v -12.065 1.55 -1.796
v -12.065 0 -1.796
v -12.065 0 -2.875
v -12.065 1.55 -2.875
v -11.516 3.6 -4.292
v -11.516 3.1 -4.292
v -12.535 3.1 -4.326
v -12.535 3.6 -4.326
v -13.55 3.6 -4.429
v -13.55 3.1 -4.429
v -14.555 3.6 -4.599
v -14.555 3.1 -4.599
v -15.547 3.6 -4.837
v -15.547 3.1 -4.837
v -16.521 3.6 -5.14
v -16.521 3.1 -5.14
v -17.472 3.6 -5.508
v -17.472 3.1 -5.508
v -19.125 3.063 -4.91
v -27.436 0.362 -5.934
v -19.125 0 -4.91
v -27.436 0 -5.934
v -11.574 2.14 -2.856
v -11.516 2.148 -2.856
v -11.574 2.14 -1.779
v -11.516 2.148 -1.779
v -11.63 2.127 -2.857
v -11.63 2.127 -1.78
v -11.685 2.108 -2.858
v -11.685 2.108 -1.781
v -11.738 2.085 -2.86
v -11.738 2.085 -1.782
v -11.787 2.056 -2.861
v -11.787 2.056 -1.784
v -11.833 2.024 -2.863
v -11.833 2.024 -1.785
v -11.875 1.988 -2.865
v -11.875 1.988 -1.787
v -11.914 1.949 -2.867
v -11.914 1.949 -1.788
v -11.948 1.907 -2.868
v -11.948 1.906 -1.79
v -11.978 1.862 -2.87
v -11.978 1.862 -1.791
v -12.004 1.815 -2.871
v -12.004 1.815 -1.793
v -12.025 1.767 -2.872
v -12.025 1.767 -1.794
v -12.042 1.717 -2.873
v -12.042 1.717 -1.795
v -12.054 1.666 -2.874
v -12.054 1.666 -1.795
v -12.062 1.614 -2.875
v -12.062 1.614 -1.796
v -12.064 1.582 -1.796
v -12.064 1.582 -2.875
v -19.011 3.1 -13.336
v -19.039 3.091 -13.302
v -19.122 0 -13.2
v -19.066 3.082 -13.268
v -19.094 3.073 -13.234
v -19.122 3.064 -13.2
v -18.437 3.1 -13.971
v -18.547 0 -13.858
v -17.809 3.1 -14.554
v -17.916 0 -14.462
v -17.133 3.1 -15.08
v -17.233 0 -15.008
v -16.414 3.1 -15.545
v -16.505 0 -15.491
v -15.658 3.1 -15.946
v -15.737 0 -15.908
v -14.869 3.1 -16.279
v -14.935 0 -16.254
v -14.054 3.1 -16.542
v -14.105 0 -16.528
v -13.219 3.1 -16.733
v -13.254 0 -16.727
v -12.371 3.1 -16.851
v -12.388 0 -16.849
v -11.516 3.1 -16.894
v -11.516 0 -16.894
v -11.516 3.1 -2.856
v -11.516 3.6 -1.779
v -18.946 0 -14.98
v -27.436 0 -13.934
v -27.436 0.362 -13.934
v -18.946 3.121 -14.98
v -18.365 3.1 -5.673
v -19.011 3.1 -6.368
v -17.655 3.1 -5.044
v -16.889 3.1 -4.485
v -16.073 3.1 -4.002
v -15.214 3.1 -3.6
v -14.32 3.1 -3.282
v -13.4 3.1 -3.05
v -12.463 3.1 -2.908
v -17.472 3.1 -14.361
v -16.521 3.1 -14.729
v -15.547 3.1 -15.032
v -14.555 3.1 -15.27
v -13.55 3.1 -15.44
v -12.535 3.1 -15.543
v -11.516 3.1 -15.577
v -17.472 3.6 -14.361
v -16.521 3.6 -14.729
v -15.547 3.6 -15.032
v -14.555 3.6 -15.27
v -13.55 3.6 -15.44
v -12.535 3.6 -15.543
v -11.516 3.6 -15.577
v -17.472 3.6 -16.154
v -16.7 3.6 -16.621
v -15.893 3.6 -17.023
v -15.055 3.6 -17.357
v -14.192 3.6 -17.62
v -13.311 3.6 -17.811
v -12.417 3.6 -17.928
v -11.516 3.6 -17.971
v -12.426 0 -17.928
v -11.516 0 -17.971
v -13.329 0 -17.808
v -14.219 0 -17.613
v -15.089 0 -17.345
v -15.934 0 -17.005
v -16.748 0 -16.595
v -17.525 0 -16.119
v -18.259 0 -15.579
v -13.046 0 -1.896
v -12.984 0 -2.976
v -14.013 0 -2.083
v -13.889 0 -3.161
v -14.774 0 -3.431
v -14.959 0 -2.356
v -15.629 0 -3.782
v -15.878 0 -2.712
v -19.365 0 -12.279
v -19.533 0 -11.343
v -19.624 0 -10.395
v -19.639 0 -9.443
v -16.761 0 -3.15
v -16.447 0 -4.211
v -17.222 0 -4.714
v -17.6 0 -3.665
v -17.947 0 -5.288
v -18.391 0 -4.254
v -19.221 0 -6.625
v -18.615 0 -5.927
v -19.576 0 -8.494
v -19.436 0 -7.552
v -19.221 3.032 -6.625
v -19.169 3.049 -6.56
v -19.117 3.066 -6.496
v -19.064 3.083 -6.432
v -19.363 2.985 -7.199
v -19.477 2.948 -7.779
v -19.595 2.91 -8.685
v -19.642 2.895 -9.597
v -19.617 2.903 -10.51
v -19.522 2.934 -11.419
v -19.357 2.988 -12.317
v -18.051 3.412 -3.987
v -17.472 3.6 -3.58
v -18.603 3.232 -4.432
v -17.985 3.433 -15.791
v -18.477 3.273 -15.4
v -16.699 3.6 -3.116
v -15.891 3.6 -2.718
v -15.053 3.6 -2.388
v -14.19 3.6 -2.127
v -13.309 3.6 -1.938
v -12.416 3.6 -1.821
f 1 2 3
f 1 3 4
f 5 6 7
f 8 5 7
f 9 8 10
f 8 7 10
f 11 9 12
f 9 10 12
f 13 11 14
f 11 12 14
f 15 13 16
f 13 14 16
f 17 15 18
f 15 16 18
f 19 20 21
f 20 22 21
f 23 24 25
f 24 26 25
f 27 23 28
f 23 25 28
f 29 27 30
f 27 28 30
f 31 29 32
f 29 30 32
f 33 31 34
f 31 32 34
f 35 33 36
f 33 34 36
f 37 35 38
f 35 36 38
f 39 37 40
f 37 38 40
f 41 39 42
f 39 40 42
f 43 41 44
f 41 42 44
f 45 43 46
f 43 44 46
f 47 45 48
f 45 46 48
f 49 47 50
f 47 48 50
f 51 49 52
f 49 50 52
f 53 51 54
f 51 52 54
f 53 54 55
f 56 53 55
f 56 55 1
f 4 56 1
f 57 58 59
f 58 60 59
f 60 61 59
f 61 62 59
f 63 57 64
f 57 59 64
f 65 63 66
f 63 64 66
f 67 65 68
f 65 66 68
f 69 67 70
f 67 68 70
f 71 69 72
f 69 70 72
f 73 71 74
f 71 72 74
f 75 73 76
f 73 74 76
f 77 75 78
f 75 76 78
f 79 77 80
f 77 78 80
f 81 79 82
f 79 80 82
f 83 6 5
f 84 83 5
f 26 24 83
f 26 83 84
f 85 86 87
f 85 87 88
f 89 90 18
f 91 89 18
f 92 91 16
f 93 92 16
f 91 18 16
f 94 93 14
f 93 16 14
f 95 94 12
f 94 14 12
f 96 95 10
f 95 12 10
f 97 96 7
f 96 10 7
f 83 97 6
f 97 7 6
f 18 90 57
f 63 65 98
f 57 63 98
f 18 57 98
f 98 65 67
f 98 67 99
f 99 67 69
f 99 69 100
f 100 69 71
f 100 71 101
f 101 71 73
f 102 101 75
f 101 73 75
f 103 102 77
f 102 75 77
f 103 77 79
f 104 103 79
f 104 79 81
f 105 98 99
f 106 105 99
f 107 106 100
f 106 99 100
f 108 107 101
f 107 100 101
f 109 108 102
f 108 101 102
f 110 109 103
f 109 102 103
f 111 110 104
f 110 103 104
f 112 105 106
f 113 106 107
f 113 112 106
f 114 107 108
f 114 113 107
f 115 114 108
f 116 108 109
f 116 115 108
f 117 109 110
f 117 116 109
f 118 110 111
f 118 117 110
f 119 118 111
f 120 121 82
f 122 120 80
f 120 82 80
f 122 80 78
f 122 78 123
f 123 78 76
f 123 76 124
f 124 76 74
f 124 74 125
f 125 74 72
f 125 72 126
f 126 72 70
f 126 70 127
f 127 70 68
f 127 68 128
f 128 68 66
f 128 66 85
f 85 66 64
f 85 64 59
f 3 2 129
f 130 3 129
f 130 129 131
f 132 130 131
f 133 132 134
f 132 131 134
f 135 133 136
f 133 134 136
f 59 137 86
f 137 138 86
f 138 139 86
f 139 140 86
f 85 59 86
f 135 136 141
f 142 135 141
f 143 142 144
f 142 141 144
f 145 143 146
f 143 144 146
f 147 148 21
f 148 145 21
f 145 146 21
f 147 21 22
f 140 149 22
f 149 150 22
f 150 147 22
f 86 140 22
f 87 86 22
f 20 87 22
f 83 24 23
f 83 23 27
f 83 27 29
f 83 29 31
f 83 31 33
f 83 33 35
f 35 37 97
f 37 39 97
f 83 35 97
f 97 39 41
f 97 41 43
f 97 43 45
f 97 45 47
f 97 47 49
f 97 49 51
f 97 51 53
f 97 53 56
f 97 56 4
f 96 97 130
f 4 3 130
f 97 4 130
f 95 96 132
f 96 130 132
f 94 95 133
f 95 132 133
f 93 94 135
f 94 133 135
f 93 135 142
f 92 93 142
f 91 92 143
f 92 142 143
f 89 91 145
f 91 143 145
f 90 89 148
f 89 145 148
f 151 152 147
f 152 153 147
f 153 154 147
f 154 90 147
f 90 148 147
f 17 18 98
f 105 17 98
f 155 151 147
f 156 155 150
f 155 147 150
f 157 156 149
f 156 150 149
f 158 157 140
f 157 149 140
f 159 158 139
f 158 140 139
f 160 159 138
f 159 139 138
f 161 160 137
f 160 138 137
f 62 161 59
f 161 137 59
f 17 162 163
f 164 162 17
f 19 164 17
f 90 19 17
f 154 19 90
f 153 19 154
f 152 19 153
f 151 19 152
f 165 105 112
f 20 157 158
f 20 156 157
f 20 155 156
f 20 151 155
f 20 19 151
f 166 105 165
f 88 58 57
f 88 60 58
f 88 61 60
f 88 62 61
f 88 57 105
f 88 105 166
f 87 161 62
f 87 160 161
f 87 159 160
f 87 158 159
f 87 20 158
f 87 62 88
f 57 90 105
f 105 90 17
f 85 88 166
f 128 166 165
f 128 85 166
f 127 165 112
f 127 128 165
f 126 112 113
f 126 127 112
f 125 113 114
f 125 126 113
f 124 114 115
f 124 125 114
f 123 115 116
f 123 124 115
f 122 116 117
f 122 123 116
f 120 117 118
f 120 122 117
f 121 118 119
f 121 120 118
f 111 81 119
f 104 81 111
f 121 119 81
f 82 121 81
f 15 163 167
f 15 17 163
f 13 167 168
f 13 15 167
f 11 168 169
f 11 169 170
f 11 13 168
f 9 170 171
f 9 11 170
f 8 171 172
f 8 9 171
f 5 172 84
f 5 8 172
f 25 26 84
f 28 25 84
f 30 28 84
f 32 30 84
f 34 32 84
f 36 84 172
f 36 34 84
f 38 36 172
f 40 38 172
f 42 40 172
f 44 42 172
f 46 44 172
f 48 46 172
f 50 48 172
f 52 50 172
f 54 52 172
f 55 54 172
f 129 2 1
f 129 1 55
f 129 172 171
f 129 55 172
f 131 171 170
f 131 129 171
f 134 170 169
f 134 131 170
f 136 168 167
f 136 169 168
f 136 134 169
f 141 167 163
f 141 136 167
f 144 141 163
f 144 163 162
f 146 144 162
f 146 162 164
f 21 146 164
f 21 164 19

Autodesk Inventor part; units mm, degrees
sketch "Skizze1" plane through (0, 0, 0) normal (0, 1, 0) x (-1, 0, 0)
  line L0 (0, 0) -> (21.4435, 0) construction
  line L1 (21.4435, 0) -> (21.4435, -17.7713) construction
  line L2 (21.4435, -17.7713) -> (0, -17.7713) construction
  line L3 (0, -17.7713) -> (0, 0) construction
  arc A0 (3.4429, -6.1124) -> (3.5369, -12.2987) centre (13.9264, -9.047) ccw
  arc A1 (3.5369, -12.2987) -> (17.7561, -12.2571) centre (10.6298, -6.5721) ccw
  arc A2 (17.8481, -6.152) -> (3.4429, -6.1124) centre (10.6298, -11.844) ccw
  arc A3 (17.7561, -12.2571) -> (17.8481, -6.152) centre (7.348, -9.047) ccw
  line L4 (3.0399, -9.047) -> (18.2399, -9.047)
  line L5 (10.6298, -2.6515) -> (10.6298, -15.6882)
  dimension "d9" = 15.2
  dimension "d12" = 13.0368
sketch "Skizze2" plane through (0, 0, 0) normal (0, 1, 0) x (-1, 0, 0)
  line L0 (0, 0) -> (21.0912, 0) construction
  line L1 (21.0912, 0) -> (21.0912, -24.0698) construction
  line L2 (21.0912, -24.0698) -> (0, -24.0698) construction
  line L3 (0, -24.0698) -> (0, 0) construction
  line L4 (17.3479, -12.3442) -> (17.5564, -17.8355)
  line L5 (0, -15.4153) -> (21.0912, -15.022)
  point P0 (17.4522, -15.0899)
  point P1 (17.8576, -15.0823)
  point P2 (2.6602, -15.3657)
  point P3 (10.1167, -10.9016)
  point P4 (10.0352, -15.2282)
  point P5 (10.3203, -19.614)
  point P6 (15.9484, -15.1179)
  point P7 (4.4034, -15.3332)
  dimension "d38" = 15.2
  dimension "d47" = 8.7147
sketch "Skizze3" plane through (0, 0, 0) normal (0, 1, 0) x (-1, 0, 0)
  line L0 (0, 0) -> (41.0457, 0) construction
  line L1 (41.0457, 0) -> (41.0457, -50.0176) construction
  line L2 (41.0457, -50.0176) -> (0, -50.0176) construction
  line L3 (0, -50.0176) -> (0, 0) construction
  arc A0 (26.8609, -29.1094) -> (14.9484, -29.1094) centre (20.9046, -43.0907) ccw
  arc A1 (14.9484, -37.9624) -> (26.8609, -37.9624) centre (20.9046, -23.981) ccw
  line L4 (26.8609, -29.1094) -> (26.8609, -37.9624)
  line L5 (14.9484, -37.9624) -> (14.9484, -29.1094)
  point P0 (20.7813, -28.8717)
  point P1 (20.996, -37.5841)
  dimension "d9" = 15.2
  dimension "d12" = 13.0368
  dimension "d49" = 8.715
  dimension "d57" = 15.1972
  dimension "d58" = 15.1972
  dimension "d59" = 11.9125
  dimension "d67" = 8.853
  dimension "d69" = 0
  dimension "d70" = 8.853
sketch "Skizze4" plane through (0, 0, 0) normal (0, 1, 0) x (-1, 0, 0)
  arc A0 (19.2206, -6.6251) -> (3.7078, -6.5825) centre (11.4473, -12.755) ccw
  arc A1 (19.1216, -13.1996) -> (19.2206, -6.6251) centre (7.9131, -9.7427) ccw
  arc A2 (3.8091, -13.2445) -> (19.1216, -13.1996) centre (11.4473, -7.0776) ccw
  arc A3 (3.7078, -6.5825) -> (3.8091, -13.2445) centre (14.9974, -9.7427) ccw
  arc A4 (20.1996, -6.1308) -> (2.731, -6.0835) centre (11.4473, -12.755) ccw
  arc A5 (20.0894, -13.7103) -> (20.1996, -6.1308) centre (7.9131, -9.7427) ccw
  arc A6 (2.8436, -13.7601) -> (20.0894, -13.7103) centre (11.4473, -7.0776) ccw
  arc A7 (2.731, -6.0835) -> (2.8436, -13.7601) centre (14.9974, -9.7427) ccw
  point P0 (0, 0)
  dimension "d60" = 1.077
extrude "Extrusion1" add sketch "Skizze4" along normal blind 3.1
sketch "Skizze8" plane through (0, 3.1, 0) normal (0, 1, 0) x (1, 0, 0)
  line L0 (-17.4719, 5.508) -> (-17.4719, 14.361)
  arc A0 (-17.4719, 5.508) -> (-5.5595, 5.508) centre (-11.5157, 19.4893) ccw
  arc A1 (-5.5595, 14.361) -> (-17.4719, 14.361) centre (-11.5157, 0.3796) ccw
  line L1 (-5.5595, 14.361) -> (-5.5595, 5.508)
  line L2 (-17.4719, 5.508) -> (-5.5595, 14.361) construction
  line L3 (-17.4719, 14.361) -> (-5.5595, 5.508) construction
  arc A2 (-19.1216, 13.1996) -> (-19.2206, 6.6251) centre (-7.9131, 9.7427) ccw construction
  arc A3 (-3.8091, 13.2445) -> (-19.1216, 13.1996) centre (-11.4473, 7.0776) ccw construction
  arc A4 (-3.7078, 6.5825) -> (-3.8091, 13.2445) centre (-14.9974, 9.7427) ccw construction
  arc A5 (-19.2206, 6.6251) -> (-3.7078, 6.5825) centre (-11.4473, 12.755) ccw construction
  arc A6 (-20.1996, 6.1308) -> (-2.731, 6.0835) centre (-11.4473, 12.755) ccw projected
  arc A7 (-2.731, 6.0835) -> (-2.8436, 13.7601) centre (-14.9974, 9.7427) ccw projected
  arc A8 (-2.8436, 13.7601) -> (-20.0894, 13.7103) centre (-11.4473, 7.0776) ccw projected
  arc A9 (-20.0894, 13.7103) -> (-20.1996, 6.1308) centre (-7.9131, 9.7427) ccw projected
  line L4 (-19.2206, 6.6251) -> (-3.8091, 13.2445) construction
  line L5 (-19.1216, 13.1996) -> (-3.7078, 6.5825) construction
  point P0 (0, 0)
  point P1 (-11.5157, 9.9345)
  point P2 (-11.5157, 9.9345)
extrude "Extrusion3" add sketch "Skizze8" along normal blind 0.5
sketch "Skizze9" plane through (0, 0, 0) normal (0, 0, 1) x (1, 0, 0)
  line L0 (-2.731, 0) -> (-20.1996, 0) construction
  line L1 (-2.731, 0) -> (-2.731, 3.6) construction
  line L2 (-20.1996, 3.6) -> (-2.731, 3.6) construction
  line L3 (-20.1996, 0) -> (-20.1996, 3.6) construction
  line L4 (-3.8091, 0) -> (-19.1216, 0) projected
  line L5 (-11.4653, 0) -> (-12.0653, 0)
  line L6 (-12.0653, 0) -> (-12.0653, 1.55)
  arc A0 (-11.4653, 2.15) -> (-12.0653, 1.55) centre (-11.4653, 1.55) ccw
  line L7 (-11.4653, 1.55) -> (-11.4653, 2.15) construction
  line L8 (-11.4653, 1.55) -> (-12.0653, 1.55) construction
  line L9 (-11.4653, 0) -> (-11.4653, 6.3928) construction
  line L10 (-20.1996, 0) -> (-2.731, 0) construction
  line L11 (-10.8653, 0) -> (-10.8653, 1.55)
  arc A1 (-10.8653, 1.55) -> (-11.4653, 2.15) centre (-11.4653, 1.55) ccw
  line L12 (-11.4653, 0) -> (-10.8653, 0)
  point P0 (0, 0)
  dimension "d75" = 0.6
  dimension "d76" = 90
  dimension "d77" = 1.55
extrude "Extrusion4" cut sketch "Skizze9" against normal up to next
sketch "Skizze10" plane through (0, 0, 0) normal (0, 1, 0) x (-1, 0, 0)
  arc A0 (5.5595, -14.361) -> (17.4719, -14.361) centre (11.5157, -0.3796) ccw projected
  line L0 (5.5595, -14.361) -> (5.5595, -5.508) projected
  arc A1 (17.4719, -5.508) -> (5.5595, -5.508) centre (11.5157, -19.4893) ccw projected
  line L1 (17.4719, -5.508) -> (17.4719, -14.361) projected
  arc A2 (20.1996, -6.1308) -> (2.731, -6.0835) centre (11.4473, -12.755) ccw projected
  arc A3 (2.731, -6.0835) -> (2.8436, -13.7601) centre (14.9974, -9.7427) ccw projected
  arc A4 (2.8436, -13.7601) -> (20.0894, -13.7103) centre (11.4473, -7.0776) ccw projected
  arc A5 (20.0894, -13.7103) -> (20.1996, -6.1308) centre (7.9131, -9.7427) ccw projected
  arc A6 (20.1996, -6.1308) -> (2.731, -6.0835) centre (11.4473, -12.755) ccw projected
  line L2 (5.5595, -14.361) -> (5.5595, -5.508) construction
  line L3 (5.5595, -9.9345) -> (-7.2798, -9.9345) construction
  line L4 (3.7452, -4.9345) -> (-3.2387, -5.9345)
  line L5 (-3.2387, -5.9345) -> (-3.2387, -9.9345)
  line L6 (3.9282, -14.9607) -> (-3.2387, -13.9345)
  line L7 (-3.2387, -13.9345) -> (-3.2387, -9.9345)
  line L8 (17.4719, -5.508) -> (17.4719, -14.361) construction
  line L9 (17.4719, -9.9345) -> (23.9782, -9.9345) construction
  line L10 (22.5662, -4.9105) -> (14.2748, -4.9105) construction
  arc A7 (2.731, -6.0835) -> (2.8436, -13.7601) centre (14.9974, -9.7427) ccw construction
  line L11 (27.4359, -9.9345) -> (27.4359, -5.9345)
  line L12 (27.4359, -5.9345) -> (19.125, -4.9105)
  line L13 (27.4359, -9.9345) -> (27.4359, -13.9345)
  line L14 (27.4359, -13.9345) -> (18.9455, -14.9805)
  point P0 (0, 0)
  point P1 (3.7452, -14.9345)
  point P2 (2.1983, -9.9345)
  point P3 (2.1983, -9.9345)
  point P4 (19.125, -14.9584)
  dimension "d80" = 5
  dimension "d82" = 8.7982
  dimension "d84" = 4
  dimension "d85" = 4
  dimension "d112" = 10.07
  dimension "d116" = 9.964
extrude "Extrusion5" add sketch "Skizze10" along normal up to surface (3.6 mm away) contours A2 L12 L11 L13 L14 A4 A5 | A2 A3 A4 L6 L7 L5 L4
ref_plane "Arbeitsebene4" through (-11.5157, 3.1, -14.361) normal (1, 0, 0) x (0, 0, -1)
split "Trennen4" plane through (-11.5157, 3.1, -14.361) removes the side toward (1, 0, 0)
ref_plane "Arbeitsebene5" through (-59.9023, 0, -9.9345) normal (0, 0, 1) x (0, 1, 0)
ref_plane "Arbeitsebene6" through (-17.4719, 3.6, -12.113) normal (-0.309, 0.9511, 0) x (0, 0, -1)
split "Trennen5" plane through (-17.4719, 3.6, -12.113) removes the side toward (-0.309, 0.9511, 0)
sketch "Skizze13" plane through (0, 0, 0) normal (0, -1, 0) x (1, 0, 0)
  line L0 (-3.7452, -4.9345) -> (3.2387, -5.9345) projected
  line L1 (3.2387, -13.9345) -> (-3.9282, -14.9607) projected
  arc A0 (-3.8091, -13.2445) -> (-3.7078, -6.5825) centre (-14.9974, -9.7427) ccw projected
  arc A1 (-3.3813, -14.9345) -> (-2.5876, -6.9345) centre (-14.9974, -9.7427) ccw
  line L2 (3.2387, -5.9345) -> (3.2387, -13.9345) projected
  line L3 (3.2387, -6.9345) -> (-2.5876, -6.9345)
  line L4 (3.2387, -14.9345) -> (-3.3813, -14.9345)
  point P0 (0, 0)
  dimension "d92" = 1
  dimension "d104" = 1
  dimension "d105" = 1
sketch "Skizze12" plane through (0, 0, 0) normal (0, -1, 0) x (1, 0, 0)
  arc A0 (-3.5369, -12.2987) -> (-3.4429, -6.1124) centre (-13.9264, -9.047) ccw projected
  arc A1 (-17.7561, -12.2571) -> (-3.5369, -12.2987) centre (-10.6298, -6.5721) ccw projected
  arc A2 (-17.8481, -6.152) -> (-17.7561, -12.2571) centre (-7.348, -9.047) ccw projected
  arc A3 (-11.2465, -2.6722) -> (-17.8481, -6.152) centre (-10.6298, -11.844) ccw projected
  line L0 (-11.2465, -2.6722) -> (-11.2465, -1.6701) projected
  arc A4 (-11.2465, -1.6701) -> (-17.9952, -4.7985) centre (-10.6298, -11.844) ccw projected
  line L1 (-25.4478, -5.693) -> (-17.9952, -4.7985) projected
  line L2 (-25.4478, -12.757) -> (-25.4478, -5.693) projected
  line L3 (-17.8374, -13.6705) -> (-25.4478, -12.757) projected
  arc A5 (-17.8374, -13.6705) -> (-3.4226, -13.6708) centre (-10.6298, -6.5721) ccw projected
  line L4 (-17.9952, -4.7985) -> (-17.963, -6.6068)
  line L5 (-17.8695, -11.8632) -> (-17.8374, -13.6705)
  arc A6 (-2.3529, -11.757) -> (-2.2753, -6.693) centre (-13.9264, -9.047) ccw projected
  line L6 (4.0611, -5.693) -> (4.0611, -6.693) projected
  line L7 (-3.2644, -4.7985) -> (4.0611, -5.693) projected
  arc A7 (-3.2644, -4.7985) -> (-10.0465, -1.6682) centre (-10.6298, -11.844) ccw projected
  line L8 (-10.0465, -1.6682) -> (-10.0465, -2.67) projected
  arc A8 (-3.4429, -6.1124) -> (-10.0465, -2.67) centre (-10.6298, -11.844) ccw projected
  line L9 (4.0611, -12.757) -> (-3.4226, -13.6708) projected
  line L10 (4.0611, -11.757) -> (4.0611, -12.757) projected
  line L11 (4.0611, -11.757) -> (-2.3529, -11.757) projected
  line L12 (-2.2753, -6.693) -> (4.0611, -6.693) projected
  point P0 (0, 0)
properties part number "Main_afterRhino_V2" material "Gold"
